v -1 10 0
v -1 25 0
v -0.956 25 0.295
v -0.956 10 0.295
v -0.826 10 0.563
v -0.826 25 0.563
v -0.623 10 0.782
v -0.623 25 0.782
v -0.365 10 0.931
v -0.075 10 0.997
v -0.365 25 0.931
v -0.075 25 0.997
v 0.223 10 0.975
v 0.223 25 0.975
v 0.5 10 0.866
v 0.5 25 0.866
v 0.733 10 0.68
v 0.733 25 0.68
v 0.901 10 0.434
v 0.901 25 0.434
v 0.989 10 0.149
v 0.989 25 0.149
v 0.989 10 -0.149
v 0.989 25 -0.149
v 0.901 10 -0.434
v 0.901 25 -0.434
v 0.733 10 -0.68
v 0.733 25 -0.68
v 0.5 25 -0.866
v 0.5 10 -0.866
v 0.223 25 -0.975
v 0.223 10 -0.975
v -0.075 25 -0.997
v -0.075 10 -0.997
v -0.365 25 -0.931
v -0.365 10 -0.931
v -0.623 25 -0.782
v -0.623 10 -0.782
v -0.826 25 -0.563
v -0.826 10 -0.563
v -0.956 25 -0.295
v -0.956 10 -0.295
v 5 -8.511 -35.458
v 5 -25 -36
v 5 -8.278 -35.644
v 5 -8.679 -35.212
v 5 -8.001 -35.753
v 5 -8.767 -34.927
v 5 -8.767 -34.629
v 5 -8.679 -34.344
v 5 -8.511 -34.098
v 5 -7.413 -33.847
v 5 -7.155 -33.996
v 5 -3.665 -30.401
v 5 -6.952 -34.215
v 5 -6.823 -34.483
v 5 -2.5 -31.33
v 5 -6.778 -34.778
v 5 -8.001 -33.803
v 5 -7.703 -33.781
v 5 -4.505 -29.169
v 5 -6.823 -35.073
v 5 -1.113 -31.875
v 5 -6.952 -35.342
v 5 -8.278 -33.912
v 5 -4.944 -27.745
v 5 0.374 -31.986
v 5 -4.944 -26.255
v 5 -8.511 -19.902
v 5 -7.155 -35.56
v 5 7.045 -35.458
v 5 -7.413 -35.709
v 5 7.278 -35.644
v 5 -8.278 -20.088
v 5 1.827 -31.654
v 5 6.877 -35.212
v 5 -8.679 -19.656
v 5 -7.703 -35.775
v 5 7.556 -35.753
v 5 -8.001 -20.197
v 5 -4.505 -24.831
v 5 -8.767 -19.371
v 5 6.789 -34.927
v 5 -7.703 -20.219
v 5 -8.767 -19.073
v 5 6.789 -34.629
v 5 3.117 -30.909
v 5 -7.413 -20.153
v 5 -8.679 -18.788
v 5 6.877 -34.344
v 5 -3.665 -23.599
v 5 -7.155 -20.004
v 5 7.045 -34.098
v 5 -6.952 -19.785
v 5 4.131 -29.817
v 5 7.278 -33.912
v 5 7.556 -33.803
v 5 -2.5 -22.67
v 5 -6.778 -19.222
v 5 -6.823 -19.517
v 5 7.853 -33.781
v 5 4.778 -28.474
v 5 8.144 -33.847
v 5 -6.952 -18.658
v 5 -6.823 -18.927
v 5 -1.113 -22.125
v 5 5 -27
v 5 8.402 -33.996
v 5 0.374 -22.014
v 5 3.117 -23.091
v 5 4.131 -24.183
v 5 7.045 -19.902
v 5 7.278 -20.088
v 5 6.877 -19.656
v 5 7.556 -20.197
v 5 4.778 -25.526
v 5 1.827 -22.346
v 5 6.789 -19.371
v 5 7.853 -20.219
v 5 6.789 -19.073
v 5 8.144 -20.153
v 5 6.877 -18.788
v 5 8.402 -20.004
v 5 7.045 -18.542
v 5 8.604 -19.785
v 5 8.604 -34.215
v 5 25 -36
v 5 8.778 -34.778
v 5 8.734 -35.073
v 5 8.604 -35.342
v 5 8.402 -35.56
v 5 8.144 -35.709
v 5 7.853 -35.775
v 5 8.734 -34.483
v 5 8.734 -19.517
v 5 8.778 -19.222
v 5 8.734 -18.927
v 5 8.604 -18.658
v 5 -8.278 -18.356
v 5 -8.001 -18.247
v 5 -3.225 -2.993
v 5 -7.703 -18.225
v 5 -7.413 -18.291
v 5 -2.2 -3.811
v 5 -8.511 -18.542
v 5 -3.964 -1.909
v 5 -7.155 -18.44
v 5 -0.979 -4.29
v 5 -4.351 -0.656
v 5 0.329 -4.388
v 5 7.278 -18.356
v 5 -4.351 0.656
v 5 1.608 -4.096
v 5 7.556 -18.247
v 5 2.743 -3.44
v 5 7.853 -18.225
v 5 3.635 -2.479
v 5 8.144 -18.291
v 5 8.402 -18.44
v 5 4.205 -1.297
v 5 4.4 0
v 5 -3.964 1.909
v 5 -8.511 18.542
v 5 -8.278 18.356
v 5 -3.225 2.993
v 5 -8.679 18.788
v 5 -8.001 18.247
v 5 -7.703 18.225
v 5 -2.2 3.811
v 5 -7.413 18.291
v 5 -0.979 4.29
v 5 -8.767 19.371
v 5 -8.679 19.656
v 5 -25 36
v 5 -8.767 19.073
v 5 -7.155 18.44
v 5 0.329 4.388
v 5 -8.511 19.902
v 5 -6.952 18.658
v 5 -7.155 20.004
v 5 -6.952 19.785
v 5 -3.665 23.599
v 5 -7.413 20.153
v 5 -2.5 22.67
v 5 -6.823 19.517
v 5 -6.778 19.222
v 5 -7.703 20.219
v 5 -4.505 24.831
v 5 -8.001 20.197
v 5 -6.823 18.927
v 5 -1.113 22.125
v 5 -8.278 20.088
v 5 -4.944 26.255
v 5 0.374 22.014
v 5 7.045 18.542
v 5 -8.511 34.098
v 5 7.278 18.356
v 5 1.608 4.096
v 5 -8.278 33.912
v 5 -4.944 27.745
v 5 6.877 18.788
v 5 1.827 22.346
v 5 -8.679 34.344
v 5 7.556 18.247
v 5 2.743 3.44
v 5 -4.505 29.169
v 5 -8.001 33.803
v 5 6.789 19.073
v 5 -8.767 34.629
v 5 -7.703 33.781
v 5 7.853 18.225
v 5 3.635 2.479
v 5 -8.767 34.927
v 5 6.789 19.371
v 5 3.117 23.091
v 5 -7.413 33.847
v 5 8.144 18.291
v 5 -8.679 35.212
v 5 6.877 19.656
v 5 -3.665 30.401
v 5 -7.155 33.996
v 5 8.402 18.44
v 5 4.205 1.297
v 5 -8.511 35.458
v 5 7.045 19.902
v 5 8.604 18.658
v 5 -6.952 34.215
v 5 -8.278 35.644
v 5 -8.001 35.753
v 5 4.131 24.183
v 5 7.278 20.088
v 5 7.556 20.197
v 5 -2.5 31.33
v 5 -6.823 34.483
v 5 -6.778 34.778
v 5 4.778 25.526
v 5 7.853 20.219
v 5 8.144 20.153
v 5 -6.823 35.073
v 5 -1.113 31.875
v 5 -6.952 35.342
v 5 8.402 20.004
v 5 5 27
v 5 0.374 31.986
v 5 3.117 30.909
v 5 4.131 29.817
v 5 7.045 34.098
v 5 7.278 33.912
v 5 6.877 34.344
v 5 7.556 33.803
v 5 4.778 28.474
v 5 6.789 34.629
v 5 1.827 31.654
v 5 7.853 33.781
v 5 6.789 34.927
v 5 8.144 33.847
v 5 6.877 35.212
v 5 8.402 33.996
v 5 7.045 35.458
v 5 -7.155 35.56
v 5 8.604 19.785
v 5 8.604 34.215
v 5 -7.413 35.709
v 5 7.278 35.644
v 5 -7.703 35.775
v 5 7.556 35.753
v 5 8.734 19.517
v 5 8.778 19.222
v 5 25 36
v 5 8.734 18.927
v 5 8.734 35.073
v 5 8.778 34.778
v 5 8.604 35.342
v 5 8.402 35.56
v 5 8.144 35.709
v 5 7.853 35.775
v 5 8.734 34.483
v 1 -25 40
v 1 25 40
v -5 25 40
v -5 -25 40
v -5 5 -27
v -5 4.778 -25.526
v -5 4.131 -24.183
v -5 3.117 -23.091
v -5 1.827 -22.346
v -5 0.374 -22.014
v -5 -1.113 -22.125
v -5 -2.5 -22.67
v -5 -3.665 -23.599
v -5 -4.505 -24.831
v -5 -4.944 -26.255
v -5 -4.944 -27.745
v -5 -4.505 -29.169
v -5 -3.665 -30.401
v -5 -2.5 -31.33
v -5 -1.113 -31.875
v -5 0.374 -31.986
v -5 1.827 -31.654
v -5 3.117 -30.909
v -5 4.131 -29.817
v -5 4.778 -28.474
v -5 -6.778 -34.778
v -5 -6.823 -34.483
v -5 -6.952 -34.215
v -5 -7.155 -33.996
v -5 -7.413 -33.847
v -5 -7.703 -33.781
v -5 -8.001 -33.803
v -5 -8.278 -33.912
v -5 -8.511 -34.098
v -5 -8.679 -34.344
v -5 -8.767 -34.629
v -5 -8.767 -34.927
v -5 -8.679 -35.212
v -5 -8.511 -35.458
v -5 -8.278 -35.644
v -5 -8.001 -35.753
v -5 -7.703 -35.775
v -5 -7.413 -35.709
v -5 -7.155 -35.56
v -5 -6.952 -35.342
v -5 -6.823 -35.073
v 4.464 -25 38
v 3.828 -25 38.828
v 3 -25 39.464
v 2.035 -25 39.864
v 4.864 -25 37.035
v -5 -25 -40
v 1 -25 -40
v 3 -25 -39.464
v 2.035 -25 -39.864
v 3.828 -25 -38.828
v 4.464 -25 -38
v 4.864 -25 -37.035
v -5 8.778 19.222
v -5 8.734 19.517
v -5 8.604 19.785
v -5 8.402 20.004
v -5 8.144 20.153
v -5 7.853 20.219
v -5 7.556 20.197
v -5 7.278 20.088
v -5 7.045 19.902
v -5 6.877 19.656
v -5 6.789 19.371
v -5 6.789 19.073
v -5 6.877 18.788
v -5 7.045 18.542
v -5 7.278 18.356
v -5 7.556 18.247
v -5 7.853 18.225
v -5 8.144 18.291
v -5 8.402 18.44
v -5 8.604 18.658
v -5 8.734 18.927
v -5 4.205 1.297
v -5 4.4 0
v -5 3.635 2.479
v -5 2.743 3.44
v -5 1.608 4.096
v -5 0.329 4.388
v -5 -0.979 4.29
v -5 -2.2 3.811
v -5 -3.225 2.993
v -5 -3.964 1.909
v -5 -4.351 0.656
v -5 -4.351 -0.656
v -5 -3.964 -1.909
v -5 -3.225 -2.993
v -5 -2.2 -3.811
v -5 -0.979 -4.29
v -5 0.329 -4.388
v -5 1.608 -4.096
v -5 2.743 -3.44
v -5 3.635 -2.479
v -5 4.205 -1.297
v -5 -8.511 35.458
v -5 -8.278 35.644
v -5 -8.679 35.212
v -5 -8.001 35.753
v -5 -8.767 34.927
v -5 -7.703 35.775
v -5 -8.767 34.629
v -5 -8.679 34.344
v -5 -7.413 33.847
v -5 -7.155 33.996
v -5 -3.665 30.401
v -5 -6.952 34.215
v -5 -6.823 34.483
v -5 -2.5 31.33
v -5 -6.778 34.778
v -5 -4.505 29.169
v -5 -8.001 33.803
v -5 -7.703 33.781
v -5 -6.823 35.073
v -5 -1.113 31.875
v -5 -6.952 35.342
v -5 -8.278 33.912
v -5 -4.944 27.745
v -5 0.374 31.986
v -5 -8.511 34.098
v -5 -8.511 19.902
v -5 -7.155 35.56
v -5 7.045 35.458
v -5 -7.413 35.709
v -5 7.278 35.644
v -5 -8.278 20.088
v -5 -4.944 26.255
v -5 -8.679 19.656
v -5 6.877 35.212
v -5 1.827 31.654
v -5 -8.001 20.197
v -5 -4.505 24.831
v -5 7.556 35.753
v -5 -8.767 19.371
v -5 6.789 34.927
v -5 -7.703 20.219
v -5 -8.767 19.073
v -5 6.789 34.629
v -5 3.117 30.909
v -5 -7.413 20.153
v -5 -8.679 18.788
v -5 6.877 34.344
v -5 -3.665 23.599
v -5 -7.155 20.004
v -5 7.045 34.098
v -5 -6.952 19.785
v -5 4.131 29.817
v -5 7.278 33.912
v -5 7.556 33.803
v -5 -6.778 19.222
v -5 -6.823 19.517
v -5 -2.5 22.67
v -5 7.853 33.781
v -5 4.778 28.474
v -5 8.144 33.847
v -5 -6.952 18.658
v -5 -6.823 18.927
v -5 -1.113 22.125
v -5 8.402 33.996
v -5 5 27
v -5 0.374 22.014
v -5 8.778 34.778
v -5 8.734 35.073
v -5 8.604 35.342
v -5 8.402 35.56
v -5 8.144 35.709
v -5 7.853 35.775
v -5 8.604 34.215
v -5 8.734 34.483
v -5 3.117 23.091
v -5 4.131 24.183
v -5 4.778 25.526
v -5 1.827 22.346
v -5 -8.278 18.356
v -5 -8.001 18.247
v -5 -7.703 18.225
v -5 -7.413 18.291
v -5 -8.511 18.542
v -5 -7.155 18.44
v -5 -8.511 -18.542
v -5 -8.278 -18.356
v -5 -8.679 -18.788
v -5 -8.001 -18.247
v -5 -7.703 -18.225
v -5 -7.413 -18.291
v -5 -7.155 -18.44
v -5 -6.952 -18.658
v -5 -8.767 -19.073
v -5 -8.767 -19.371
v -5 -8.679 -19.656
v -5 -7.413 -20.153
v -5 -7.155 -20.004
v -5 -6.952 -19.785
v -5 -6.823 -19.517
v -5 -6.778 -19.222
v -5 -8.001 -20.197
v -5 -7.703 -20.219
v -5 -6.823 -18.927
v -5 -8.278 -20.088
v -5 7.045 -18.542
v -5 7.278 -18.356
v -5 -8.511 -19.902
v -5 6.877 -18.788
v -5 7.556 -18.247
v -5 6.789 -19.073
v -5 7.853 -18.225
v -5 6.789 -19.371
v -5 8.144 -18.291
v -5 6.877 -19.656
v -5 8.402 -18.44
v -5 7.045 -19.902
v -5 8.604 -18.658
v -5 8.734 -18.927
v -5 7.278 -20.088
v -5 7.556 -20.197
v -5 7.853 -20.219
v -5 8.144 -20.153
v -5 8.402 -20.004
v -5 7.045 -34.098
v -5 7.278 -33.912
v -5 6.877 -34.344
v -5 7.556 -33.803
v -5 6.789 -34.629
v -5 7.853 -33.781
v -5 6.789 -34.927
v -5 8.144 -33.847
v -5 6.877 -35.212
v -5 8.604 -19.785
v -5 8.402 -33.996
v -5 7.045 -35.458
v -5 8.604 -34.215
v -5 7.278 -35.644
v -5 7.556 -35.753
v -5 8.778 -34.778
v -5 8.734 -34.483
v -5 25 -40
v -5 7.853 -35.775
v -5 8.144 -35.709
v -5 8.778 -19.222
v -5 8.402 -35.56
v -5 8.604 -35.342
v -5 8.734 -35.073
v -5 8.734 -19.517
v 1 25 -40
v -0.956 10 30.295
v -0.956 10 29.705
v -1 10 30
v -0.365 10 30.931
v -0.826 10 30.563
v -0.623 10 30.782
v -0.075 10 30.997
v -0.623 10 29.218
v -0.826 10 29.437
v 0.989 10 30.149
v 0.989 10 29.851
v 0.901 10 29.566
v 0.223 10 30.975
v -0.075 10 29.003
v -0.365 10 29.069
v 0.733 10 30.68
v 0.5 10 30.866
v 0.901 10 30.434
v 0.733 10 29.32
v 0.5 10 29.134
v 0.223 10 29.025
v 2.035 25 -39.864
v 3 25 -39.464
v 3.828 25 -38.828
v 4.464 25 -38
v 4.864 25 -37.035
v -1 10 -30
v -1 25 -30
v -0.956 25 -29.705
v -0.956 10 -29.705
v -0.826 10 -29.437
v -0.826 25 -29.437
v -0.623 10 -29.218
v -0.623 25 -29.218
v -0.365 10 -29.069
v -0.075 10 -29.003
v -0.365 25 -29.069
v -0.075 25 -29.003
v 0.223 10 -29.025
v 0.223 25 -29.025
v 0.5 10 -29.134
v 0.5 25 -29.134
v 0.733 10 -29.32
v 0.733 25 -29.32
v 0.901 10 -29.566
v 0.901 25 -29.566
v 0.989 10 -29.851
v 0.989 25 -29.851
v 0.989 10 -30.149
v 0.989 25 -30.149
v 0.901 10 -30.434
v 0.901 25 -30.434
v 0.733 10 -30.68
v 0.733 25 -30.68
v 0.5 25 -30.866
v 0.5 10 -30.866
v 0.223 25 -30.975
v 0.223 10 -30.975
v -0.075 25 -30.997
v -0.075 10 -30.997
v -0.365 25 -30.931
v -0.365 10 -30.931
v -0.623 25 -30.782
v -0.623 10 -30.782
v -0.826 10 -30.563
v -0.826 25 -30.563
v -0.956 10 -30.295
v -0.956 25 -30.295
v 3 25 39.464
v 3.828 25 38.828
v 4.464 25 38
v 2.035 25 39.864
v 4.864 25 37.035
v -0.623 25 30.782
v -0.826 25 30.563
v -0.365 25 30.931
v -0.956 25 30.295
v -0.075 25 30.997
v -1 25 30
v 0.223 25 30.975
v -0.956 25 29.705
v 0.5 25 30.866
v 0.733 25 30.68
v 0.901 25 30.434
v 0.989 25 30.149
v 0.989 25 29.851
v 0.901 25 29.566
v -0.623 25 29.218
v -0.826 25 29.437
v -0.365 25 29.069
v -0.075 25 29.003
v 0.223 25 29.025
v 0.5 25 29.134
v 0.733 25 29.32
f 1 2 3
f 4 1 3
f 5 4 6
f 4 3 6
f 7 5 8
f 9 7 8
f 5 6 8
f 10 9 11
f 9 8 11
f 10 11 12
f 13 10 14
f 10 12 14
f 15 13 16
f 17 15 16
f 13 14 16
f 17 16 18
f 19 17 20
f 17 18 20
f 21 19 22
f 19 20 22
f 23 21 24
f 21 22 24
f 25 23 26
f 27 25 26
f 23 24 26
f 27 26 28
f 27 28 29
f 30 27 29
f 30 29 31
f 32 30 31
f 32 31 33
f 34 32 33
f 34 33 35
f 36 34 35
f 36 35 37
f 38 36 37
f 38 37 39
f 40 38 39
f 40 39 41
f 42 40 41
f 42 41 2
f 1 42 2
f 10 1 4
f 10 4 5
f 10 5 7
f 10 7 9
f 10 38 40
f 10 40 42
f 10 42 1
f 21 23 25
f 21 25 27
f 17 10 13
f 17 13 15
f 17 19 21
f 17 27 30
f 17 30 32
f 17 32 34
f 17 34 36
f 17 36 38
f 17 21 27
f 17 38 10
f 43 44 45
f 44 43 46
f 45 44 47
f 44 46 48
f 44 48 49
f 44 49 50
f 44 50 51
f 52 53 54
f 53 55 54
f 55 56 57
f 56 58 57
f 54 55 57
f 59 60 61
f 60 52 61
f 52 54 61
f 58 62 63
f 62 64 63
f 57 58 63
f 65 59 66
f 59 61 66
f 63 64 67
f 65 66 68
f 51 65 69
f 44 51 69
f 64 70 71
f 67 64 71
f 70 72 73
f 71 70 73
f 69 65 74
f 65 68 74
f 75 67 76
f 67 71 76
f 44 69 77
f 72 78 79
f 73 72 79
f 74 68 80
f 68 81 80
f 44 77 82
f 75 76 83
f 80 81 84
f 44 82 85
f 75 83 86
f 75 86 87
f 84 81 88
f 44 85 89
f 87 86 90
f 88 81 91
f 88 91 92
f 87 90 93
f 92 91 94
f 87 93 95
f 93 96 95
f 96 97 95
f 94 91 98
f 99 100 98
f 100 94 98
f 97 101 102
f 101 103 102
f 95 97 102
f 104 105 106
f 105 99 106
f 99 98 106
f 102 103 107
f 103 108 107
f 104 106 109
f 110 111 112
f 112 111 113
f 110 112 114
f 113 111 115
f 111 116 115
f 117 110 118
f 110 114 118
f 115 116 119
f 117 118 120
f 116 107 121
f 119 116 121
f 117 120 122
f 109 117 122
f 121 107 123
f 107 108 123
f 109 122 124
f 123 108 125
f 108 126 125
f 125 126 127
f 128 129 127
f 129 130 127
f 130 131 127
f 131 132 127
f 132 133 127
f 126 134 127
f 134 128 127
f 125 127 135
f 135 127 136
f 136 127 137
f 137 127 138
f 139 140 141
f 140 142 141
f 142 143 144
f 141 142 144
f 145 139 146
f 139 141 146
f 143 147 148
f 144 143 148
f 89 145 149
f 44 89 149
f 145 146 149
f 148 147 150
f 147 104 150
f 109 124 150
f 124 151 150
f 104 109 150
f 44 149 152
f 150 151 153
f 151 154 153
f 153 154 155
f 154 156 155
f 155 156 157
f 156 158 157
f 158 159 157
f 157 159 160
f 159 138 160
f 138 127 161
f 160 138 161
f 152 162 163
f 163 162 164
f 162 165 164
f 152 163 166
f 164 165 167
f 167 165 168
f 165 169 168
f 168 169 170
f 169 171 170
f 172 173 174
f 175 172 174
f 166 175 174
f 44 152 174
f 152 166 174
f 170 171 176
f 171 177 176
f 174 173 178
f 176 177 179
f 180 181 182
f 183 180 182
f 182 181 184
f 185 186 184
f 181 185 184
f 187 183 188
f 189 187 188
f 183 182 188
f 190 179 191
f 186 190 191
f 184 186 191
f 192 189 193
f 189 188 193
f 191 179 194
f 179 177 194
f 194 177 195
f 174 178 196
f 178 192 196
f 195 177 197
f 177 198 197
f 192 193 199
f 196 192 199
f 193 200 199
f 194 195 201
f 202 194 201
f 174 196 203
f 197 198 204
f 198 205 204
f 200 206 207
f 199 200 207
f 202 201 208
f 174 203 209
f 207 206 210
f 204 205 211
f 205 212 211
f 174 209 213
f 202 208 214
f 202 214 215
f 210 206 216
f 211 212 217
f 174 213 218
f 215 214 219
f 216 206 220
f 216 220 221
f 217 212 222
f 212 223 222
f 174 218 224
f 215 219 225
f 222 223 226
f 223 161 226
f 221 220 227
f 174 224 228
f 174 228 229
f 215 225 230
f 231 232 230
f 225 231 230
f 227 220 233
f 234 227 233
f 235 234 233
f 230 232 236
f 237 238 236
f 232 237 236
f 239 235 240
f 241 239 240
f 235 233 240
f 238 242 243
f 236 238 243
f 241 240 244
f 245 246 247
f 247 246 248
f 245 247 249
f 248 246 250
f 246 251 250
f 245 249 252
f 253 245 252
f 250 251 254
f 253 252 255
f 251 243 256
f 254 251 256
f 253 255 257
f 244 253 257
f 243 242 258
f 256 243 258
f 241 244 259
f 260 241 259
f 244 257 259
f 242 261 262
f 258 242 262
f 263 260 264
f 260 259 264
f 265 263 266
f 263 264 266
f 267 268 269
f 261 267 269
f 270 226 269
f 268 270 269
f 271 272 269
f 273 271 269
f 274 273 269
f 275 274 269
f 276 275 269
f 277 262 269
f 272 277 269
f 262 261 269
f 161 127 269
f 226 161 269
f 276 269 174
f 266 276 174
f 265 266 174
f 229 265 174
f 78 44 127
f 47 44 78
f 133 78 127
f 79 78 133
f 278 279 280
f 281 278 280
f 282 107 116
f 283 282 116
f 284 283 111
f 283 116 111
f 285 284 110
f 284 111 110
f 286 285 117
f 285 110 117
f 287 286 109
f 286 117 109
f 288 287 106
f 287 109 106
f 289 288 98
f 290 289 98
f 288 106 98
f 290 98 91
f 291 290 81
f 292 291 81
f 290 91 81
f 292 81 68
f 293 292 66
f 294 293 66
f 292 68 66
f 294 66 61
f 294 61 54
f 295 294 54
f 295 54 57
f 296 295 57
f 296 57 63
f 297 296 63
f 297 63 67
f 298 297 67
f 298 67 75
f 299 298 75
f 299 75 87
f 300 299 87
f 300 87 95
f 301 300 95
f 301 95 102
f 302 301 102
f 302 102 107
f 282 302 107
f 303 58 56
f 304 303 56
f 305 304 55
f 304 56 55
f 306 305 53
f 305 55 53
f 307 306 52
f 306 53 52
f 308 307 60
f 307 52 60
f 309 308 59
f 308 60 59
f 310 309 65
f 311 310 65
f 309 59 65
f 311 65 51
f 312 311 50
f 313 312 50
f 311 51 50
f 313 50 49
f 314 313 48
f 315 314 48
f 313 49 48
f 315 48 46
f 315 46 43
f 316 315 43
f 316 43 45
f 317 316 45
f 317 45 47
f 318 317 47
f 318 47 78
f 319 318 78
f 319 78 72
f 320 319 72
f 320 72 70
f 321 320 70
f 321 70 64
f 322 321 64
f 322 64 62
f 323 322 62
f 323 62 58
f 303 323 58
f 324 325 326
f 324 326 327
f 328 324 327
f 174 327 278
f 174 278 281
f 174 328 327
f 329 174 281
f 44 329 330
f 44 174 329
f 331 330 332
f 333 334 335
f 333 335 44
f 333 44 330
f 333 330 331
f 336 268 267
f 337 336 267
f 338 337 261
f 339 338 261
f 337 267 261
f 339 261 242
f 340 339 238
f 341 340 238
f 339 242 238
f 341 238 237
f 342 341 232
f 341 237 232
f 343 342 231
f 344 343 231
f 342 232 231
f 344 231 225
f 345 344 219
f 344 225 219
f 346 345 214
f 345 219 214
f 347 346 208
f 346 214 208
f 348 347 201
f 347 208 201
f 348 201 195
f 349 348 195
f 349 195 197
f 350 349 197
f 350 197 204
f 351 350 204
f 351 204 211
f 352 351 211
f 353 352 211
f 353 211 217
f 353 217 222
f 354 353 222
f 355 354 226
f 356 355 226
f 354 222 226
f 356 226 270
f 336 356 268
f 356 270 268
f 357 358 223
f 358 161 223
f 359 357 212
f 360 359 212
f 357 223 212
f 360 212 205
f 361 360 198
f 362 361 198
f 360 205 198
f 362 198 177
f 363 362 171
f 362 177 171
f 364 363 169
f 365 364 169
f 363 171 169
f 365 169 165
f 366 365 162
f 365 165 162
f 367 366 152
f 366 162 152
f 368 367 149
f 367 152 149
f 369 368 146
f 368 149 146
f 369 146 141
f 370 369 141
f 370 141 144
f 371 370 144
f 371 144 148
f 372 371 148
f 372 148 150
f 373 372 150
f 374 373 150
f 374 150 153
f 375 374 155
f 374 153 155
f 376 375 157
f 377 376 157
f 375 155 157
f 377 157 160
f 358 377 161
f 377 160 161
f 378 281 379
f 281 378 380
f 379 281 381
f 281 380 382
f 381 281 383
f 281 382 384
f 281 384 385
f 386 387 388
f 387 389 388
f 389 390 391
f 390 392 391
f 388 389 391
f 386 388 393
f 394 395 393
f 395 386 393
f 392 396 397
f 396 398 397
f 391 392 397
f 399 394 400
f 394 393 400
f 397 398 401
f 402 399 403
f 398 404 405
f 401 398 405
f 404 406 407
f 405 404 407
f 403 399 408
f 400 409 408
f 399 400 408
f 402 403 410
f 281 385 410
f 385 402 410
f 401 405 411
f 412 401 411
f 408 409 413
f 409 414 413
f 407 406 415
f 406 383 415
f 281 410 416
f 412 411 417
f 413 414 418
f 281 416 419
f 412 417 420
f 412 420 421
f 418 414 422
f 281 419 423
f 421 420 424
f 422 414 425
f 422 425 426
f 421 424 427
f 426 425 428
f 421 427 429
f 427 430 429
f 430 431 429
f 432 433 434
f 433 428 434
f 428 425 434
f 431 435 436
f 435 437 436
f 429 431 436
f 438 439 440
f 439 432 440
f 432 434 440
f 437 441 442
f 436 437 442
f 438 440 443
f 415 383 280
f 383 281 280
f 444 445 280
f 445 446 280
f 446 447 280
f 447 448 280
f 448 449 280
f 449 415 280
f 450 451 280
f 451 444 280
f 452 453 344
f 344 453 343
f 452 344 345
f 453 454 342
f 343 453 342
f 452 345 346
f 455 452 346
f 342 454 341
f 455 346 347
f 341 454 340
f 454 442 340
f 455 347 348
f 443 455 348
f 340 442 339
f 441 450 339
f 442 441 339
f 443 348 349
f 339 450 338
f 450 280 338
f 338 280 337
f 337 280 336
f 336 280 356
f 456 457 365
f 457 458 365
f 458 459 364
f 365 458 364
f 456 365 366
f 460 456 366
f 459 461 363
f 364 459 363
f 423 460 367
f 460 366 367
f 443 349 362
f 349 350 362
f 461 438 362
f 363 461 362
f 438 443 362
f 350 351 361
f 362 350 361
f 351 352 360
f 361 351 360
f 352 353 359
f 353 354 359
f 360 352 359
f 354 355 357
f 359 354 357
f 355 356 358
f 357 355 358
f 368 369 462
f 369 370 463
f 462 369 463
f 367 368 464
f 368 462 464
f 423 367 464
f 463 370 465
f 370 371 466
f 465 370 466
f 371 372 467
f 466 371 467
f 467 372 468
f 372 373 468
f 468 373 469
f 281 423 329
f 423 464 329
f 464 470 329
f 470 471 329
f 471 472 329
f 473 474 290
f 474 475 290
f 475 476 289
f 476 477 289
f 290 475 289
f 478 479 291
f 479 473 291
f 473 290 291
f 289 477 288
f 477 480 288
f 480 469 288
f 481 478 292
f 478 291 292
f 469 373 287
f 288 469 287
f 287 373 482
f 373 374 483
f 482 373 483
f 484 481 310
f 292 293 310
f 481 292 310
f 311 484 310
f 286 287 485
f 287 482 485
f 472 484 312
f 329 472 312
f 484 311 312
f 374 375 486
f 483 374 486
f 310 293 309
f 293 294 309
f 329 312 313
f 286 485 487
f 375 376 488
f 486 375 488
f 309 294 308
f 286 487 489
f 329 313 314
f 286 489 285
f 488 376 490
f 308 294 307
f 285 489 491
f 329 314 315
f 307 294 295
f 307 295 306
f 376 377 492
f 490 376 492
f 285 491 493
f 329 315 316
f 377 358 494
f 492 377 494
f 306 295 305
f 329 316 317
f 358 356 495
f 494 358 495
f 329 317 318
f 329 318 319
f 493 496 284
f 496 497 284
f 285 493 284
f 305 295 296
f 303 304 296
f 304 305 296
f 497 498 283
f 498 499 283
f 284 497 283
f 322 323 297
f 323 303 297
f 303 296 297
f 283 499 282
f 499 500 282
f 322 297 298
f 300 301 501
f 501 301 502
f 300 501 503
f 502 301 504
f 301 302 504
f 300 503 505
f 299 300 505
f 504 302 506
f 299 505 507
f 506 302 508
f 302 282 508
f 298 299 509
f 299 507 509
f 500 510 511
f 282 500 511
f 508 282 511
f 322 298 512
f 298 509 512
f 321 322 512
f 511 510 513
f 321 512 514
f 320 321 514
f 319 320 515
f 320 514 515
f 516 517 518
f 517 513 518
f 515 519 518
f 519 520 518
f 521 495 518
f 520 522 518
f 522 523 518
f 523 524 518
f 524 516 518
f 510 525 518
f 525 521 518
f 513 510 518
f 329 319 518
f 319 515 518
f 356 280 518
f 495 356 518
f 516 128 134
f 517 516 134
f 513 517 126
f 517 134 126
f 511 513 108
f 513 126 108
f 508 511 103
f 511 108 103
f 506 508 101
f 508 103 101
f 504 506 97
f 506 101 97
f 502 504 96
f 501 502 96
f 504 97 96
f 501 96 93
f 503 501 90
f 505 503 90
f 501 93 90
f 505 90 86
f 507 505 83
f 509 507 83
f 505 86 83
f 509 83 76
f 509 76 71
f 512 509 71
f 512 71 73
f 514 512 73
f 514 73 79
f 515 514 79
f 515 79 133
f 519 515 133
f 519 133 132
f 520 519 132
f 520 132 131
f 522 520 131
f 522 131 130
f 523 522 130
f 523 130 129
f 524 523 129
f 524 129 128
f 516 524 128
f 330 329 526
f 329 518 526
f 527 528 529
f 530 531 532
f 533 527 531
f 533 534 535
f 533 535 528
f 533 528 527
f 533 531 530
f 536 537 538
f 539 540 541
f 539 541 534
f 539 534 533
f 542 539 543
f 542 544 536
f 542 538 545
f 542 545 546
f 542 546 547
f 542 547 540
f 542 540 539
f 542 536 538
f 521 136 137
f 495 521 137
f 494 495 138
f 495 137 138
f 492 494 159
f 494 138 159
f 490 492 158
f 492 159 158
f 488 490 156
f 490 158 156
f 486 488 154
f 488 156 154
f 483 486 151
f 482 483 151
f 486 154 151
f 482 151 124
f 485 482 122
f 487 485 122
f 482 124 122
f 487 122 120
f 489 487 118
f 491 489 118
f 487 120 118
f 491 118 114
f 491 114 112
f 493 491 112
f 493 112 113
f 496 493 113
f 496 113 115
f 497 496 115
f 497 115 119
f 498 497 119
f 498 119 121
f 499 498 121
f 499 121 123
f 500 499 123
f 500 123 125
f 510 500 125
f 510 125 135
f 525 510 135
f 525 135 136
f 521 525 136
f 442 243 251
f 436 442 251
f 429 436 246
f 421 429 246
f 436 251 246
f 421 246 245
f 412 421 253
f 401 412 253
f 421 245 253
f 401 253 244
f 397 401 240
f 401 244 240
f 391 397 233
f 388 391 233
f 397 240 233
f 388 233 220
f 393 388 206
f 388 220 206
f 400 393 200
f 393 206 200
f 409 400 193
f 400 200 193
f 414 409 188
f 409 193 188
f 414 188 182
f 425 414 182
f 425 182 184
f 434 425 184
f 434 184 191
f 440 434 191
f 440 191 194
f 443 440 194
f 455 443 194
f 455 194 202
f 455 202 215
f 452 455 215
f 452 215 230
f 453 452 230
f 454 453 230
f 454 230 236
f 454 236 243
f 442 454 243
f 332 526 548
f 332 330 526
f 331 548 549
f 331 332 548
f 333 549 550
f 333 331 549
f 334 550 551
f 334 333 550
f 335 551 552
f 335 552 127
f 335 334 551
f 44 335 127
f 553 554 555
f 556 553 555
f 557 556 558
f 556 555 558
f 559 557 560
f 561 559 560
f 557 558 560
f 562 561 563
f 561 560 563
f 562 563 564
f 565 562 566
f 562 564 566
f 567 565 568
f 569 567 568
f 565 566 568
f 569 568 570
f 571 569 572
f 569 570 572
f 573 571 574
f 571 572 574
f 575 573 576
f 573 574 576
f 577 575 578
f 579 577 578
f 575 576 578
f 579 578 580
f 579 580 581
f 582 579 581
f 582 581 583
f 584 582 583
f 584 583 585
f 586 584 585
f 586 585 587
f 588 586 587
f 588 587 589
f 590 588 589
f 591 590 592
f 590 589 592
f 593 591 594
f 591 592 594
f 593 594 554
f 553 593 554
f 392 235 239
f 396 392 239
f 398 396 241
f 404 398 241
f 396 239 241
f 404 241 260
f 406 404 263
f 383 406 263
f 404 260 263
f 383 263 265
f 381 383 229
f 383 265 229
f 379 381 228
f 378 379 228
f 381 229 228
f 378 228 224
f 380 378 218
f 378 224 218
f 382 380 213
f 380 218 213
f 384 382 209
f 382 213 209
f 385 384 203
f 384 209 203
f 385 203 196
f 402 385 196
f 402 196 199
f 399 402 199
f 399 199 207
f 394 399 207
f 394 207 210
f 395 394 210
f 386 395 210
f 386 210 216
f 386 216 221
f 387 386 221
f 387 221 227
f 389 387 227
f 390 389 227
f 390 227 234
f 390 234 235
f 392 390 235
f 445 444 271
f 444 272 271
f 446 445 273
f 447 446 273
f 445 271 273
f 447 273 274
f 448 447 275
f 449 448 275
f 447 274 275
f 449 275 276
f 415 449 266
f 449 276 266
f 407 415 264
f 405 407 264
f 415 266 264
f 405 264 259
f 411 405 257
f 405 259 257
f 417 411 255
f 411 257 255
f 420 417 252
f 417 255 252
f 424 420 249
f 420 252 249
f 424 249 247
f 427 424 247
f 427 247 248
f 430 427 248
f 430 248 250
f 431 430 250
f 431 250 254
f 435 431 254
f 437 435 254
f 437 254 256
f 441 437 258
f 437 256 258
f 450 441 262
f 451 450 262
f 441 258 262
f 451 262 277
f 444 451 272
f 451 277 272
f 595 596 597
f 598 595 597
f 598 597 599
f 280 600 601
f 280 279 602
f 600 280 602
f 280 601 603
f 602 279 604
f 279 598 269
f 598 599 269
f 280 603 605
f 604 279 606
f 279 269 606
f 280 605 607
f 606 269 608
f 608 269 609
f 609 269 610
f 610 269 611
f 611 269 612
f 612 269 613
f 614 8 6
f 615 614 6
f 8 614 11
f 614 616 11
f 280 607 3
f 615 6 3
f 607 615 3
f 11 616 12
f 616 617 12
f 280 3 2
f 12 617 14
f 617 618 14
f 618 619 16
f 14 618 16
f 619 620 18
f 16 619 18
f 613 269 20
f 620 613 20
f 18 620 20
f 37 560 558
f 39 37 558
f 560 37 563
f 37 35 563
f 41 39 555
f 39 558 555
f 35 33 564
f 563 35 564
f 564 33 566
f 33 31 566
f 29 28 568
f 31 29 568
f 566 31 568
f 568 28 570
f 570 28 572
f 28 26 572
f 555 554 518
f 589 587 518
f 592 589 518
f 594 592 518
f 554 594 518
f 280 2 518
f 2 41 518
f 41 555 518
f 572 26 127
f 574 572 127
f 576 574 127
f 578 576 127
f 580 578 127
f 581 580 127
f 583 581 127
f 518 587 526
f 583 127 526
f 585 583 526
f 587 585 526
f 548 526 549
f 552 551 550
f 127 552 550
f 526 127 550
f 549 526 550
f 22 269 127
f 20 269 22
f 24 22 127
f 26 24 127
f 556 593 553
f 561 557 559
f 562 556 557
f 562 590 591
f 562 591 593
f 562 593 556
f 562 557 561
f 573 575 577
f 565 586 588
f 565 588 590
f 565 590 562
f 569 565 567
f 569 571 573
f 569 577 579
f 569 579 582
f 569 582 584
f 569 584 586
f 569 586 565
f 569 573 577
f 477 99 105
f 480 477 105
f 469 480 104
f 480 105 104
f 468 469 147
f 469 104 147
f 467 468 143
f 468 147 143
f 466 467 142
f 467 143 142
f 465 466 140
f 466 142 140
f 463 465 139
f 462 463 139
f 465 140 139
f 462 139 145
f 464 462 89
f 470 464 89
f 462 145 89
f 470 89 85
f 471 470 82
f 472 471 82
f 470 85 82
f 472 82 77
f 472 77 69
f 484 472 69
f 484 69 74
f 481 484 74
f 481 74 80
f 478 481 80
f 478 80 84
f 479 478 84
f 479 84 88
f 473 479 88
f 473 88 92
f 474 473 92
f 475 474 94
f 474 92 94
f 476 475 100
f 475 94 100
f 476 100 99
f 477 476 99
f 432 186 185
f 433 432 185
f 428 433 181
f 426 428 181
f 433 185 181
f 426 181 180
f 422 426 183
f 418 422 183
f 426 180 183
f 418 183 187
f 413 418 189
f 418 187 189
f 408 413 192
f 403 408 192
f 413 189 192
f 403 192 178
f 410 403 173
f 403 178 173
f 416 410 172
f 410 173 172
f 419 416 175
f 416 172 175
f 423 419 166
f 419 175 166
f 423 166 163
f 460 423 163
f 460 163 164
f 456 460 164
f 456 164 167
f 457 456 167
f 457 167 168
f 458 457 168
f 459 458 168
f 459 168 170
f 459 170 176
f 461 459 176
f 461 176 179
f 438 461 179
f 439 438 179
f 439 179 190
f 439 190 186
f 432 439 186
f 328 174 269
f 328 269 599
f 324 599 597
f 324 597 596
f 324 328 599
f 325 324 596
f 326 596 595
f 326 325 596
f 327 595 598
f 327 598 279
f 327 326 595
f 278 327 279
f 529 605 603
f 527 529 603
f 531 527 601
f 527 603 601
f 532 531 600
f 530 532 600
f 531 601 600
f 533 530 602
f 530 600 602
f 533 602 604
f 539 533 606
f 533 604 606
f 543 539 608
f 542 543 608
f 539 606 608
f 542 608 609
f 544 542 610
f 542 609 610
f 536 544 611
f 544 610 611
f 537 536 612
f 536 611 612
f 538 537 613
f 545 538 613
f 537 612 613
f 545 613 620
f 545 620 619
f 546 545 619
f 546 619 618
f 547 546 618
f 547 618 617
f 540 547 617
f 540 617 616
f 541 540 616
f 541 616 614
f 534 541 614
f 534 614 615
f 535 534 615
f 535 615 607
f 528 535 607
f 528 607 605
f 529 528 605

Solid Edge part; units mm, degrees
sketch "Sketch1" plane through (0, 0, 0) normal (0, -1, 0) x (1, 0, 0)
  line L0 (-5, -40) -> (5, -40)
  line L1 (5, -40) -> (5, 40)
  line L2 (5, 40) -> (-5, 40)
  line L3 (-5, 40) -> (-5, -40)
  dimension "D1" = 10
  dimension "D2" = 80
extrude "Protrusion1" add sketch "Sketch1" along normal mid plane 50
sketch "Sketch2" plane through (5, 0, 0) normal (1, 0, 0) x (0, 1, 0)
  circle A0 centre (0, 0) radius 4.4
  dimension "D1" = 8.8
extrude "Cutout1" cut sketch "Sketch2" against normal through all
sketch "Sketch3" plane through (5, 0, 0) normal (1, 0, 0) x (0, 1, 0)
  circle A0 centre (-7.7782, 34.7782) radius 1
  circle A1 centre (-7.7782, 19.2218) radius 1
  circle A2 centre (7.7782, 19.2218) radius 1
  circle A3 centre (7.7782, 34.7782) radius 1
  circle A4 centre (0, 27) radius 5
  dimension "D1" = 22
  dimension "D2" = 27
extrude "Cutout2" cut sketch "Sketch3" against normal through all
mirror "Mirror1" about plane through (0, 0, 0) normal (0, 0, 1) of "Cutout2"
sketch "Sketch4" plane through (0, 25, 0) normal (0, 1, 0) x (-1, 0, 0)
  circle A0 centre (0, 30) radius 1
  circle A1 centre (0, 0) radius 1
  circle A2 centre (0, -30) radius 1
  dimension "D1" = 60
  dimension "D2" = 2
extrude "Extrusionsausschnitt_6" cut sketch "Sketch4" against normal blind 15
fillet "Verrundung_3" radius 4 2 edges at (5, 0, 40) (5, 0, -40)
properties material "Nylon, allgemein"
